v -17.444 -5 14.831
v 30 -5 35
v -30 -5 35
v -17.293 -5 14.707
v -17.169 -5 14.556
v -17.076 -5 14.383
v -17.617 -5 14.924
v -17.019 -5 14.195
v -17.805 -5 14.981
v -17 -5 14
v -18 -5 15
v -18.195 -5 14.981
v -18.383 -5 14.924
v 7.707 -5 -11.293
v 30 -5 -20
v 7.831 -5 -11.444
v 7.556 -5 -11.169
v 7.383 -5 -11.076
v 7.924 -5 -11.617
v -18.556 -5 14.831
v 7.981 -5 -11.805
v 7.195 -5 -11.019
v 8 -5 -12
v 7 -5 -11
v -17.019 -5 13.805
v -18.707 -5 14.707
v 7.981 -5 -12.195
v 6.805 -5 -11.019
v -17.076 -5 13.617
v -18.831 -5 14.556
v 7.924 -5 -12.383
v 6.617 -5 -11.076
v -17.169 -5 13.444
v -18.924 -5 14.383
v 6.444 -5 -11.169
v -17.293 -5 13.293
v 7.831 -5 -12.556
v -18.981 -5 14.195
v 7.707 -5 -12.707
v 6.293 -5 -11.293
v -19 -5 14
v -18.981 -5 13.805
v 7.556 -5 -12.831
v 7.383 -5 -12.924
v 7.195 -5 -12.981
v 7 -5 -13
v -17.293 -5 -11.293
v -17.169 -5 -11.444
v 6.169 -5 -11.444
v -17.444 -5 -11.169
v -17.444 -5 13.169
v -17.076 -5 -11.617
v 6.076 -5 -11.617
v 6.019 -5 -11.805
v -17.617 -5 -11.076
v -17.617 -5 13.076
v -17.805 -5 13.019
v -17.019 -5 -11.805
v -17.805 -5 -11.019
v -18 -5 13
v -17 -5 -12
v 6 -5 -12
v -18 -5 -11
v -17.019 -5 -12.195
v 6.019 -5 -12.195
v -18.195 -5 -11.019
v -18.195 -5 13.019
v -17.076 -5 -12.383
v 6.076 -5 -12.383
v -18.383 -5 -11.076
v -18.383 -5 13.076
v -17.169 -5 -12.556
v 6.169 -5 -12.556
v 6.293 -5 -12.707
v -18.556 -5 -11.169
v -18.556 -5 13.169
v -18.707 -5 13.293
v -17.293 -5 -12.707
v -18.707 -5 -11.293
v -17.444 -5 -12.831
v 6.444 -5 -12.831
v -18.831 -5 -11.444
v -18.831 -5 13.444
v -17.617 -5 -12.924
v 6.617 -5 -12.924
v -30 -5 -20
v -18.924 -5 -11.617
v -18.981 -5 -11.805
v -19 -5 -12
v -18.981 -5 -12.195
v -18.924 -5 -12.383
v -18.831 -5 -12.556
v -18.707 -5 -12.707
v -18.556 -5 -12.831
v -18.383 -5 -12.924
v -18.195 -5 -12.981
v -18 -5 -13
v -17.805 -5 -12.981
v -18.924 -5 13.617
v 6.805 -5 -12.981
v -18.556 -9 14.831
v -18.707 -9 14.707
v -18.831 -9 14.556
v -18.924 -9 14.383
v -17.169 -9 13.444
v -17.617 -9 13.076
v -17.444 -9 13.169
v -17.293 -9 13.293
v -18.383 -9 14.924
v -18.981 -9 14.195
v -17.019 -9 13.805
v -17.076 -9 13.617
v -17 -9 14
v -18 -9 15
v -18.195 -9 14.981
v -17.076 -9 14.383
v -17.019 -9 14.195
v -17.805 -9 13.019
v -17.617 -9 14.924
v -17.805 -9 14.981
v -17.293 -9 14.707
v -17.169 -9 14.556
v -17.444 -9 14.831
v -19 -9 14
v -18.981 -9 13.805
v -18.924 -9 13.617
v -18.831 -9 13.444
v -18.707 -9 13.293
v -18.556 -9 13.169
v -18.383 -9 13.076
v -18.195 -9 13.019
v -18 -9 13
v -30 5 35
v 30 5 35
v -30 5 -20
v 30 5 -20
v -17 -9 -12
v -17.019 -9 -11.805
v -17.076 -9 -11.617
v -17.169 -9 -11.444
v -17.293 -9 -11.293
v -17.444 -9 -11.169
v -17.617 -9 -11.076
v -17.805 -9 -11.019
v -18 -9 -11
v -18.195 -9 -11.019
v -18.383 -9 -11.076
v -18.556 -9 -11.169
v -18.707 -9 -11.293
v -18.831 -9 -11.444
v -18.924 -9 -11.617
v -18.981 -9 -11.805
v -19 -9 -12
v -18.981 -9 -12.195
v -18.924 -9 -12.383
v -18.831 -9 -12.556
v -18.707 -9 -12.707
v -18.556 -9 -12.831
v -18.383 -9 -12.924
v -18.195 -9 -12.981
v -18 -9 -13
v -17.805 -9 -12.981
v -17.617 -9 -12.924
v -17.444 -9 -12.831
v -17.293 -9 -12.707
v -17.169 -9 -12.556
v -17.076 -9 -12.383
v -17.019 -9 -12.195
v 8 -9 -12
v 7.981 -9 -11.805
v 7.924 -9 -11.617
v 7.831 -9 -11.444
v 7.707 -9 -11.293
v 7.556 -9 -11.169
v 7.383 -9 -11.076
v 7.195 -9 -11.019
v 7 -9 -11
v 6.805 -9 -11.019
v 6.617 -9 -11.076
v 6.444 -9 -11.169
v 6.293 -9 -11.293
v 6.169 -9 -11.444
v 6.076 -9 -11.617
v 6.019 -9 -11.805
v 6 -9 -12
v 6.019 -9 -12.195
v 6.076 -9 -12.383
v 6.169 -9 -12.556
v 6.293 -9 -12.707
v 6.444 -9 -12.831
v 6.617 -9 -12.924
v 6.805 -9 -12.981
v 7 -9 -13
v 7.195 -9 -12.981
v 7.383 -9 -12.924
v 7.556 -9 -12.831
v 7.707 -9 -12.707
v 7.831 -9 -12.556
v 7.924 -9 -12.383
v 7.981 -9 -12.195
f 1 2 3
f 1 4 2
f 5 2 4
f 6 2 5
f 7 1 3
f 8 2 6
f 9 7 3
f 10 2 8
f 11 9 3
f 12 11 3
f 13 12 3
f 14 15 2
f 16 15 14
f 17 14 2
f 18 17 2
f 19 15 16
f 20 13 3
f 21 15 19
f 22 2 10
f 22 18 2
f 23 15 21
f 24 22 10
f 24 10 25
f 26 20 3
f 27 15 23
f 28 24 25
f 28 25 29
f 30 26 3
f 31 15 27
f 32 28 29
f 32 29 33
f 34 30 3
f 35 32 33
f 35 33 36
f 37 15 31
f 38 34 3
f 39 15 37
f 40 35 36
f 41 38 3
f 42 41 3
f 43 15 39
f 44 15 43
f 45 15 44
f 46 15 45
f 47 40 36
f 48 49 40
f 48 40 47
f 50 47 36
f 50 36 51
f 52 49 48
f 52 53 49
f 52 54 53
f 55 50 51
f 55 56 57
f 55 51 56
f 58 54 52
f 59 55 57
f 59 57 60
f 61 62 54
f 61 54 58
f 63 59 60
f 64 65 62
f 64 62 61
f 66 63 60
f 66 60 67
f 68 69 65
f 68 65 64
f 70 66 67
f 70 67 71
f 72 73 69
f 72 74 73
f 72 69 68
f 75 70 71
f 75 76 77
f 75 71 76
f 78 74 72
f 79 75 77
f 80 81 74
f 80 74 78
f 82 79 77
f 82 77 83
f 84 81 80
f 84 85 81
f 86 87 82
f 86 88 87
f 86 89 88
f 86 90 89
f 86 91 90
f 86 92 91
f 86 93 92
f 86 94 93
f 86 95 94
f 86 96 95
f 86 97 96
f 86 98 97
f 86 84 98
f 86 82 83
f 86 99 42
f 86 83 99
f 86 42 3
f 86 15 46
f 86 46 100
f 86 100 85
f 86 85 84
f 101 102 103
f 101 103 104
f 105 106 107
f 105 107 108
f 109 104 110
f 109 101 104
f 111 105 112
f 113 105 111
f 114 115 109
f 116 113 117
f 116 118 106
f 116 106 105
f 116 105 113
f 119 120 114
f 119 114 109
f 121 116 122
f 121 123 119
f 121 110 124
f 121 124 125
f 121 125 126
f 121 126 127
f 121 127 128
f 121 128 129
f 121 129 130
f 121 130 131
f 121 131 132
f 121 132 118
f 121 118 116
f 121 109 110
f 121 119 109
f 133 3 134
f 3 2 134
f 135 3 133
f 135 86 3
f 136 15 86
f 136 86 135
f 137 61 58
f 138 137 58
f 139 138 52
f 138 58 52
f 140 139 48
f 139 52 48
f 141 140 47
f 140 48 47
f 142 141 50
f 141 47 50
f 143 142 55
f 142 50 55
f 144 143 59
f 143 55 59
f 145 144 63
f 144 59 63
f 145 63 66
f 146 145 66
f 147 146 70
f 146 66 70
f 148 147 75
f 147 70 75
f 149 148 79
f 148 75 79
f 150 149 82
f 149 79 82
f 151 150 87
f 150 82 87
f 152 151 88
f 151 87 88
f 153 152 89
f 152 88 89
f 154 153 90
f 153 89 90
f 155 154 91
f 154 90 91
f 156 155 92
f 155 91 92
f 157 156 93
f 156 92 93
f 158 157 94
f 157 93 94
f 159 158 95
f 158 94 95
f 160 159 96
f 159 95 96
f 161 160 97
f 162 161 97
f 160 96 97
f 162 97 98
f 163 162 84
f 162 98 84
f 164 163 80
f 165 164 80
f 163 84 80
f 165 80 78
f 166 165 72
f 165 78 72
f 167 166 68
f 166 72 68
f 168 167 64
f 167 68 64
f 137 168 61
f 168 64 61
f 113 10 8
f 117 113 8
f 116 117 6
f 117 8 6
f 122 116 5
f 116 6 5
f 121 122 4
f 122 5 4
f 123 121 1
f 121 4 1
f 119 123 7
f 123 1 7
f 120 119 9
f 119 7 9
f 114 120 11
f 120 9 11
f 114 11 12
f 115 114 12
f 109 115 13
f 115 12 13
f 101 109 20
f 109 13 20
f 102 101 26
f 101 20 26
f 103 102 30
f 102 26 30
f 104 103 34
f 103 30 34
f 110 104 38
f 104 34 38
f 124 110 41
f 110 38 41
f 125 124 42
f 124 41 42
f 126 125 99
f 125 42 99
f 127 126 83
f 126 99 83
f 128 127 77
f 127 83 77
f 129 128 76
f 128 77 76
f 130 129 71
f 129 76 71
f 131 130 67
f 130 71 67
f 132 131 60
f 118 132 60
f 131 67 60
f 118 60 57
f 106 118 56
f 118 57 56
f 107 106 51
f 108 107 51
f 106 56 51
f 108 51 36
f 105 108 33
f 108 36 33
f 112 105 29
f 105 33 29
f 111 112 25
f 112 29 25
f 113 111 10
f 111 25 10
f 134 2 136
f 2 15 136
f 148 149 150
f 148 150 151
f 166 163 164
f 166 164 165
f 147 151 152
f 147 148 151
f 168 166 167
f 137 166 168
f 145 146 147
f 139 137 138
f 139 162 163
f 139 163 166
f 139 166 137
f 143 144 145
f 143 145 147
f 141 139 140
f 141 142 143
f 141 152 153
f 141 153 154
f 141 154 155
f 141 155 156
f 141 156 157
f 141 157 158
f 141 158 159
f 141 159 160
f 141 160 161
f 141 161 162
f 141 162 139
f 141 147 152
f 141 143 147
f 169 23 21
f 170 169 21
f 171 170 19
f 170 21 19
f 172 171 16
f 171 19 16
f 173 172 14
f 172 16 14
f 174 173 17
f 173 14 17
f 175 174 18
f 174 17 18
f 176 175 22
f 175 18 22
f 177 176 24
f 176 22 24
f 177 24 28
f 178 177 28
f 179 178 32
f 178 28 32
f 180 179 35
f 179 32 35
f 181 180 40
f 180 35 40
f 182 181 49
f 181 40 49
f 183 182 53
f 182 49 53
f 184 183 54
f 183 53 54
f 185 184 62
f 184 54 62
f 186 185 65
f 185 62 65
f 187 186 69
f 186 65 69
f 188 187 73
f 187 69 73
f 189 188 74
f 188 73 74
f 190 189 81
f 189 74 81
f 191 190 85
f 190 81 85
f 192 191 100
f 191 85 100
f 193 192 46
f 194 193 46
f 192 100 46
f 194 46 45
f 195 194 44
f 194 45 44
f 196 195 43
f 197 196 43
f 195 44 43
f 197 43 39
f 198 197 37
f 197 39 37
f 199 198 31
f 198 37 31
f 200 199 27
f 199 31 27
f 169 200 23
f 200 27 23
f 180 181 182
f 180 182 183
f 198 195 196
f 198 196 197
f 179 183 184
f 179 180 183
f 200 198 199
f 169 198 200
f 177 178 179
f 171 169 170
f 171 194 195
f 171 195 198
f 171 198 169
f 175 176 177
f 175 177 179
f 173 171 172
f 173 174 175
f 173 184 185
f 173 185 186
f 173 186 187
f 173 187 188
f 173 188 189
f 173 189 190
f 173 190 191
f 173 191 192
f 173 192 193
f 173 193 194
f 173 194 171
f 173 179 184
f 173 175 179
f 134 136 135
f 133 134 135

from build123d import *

# Parameters (mm, degrees)
F0_W          = 10
F0_H          = 40
F1_DEPTH      = 30
F1_DEPTH_BACK = 30
F2_R          = 1
F3_DEPTH      = 4
F4_DEPTH      = 15


with BuildPart() as f1:
    # F0 (on Right) → F1 (new body, two sides)
    with BuildSketch(Plane.YZ) as f1_sk:
        Rectangle(F0_W, F0_H)
    extrude(amount=F1_DEPTH)
    extrude(f1_sk.sketch, amount=-F1_DEPTH_BACK)

    # F2 (on face) → F3 (join)
    with BuildSketch(Plane.XZ.offset(5)):
        with Locations((-18, 14)):
            Circle(F2_R)
        with Locations((-18, -12)):
            Circle(F2_R)
        with Locations((7, -12)):
            Circle(F2_R)
    extrude(amount=F3_DEPTH)

    # F4 (add): a face of the model
    f4_faces = [f1.faces().sort_by_distance(p)[0] for p in [
        (0, 0, 20),
    ]]
    extrude(f4_faces, amount=F4_DEPTH)


solid = f1.part
